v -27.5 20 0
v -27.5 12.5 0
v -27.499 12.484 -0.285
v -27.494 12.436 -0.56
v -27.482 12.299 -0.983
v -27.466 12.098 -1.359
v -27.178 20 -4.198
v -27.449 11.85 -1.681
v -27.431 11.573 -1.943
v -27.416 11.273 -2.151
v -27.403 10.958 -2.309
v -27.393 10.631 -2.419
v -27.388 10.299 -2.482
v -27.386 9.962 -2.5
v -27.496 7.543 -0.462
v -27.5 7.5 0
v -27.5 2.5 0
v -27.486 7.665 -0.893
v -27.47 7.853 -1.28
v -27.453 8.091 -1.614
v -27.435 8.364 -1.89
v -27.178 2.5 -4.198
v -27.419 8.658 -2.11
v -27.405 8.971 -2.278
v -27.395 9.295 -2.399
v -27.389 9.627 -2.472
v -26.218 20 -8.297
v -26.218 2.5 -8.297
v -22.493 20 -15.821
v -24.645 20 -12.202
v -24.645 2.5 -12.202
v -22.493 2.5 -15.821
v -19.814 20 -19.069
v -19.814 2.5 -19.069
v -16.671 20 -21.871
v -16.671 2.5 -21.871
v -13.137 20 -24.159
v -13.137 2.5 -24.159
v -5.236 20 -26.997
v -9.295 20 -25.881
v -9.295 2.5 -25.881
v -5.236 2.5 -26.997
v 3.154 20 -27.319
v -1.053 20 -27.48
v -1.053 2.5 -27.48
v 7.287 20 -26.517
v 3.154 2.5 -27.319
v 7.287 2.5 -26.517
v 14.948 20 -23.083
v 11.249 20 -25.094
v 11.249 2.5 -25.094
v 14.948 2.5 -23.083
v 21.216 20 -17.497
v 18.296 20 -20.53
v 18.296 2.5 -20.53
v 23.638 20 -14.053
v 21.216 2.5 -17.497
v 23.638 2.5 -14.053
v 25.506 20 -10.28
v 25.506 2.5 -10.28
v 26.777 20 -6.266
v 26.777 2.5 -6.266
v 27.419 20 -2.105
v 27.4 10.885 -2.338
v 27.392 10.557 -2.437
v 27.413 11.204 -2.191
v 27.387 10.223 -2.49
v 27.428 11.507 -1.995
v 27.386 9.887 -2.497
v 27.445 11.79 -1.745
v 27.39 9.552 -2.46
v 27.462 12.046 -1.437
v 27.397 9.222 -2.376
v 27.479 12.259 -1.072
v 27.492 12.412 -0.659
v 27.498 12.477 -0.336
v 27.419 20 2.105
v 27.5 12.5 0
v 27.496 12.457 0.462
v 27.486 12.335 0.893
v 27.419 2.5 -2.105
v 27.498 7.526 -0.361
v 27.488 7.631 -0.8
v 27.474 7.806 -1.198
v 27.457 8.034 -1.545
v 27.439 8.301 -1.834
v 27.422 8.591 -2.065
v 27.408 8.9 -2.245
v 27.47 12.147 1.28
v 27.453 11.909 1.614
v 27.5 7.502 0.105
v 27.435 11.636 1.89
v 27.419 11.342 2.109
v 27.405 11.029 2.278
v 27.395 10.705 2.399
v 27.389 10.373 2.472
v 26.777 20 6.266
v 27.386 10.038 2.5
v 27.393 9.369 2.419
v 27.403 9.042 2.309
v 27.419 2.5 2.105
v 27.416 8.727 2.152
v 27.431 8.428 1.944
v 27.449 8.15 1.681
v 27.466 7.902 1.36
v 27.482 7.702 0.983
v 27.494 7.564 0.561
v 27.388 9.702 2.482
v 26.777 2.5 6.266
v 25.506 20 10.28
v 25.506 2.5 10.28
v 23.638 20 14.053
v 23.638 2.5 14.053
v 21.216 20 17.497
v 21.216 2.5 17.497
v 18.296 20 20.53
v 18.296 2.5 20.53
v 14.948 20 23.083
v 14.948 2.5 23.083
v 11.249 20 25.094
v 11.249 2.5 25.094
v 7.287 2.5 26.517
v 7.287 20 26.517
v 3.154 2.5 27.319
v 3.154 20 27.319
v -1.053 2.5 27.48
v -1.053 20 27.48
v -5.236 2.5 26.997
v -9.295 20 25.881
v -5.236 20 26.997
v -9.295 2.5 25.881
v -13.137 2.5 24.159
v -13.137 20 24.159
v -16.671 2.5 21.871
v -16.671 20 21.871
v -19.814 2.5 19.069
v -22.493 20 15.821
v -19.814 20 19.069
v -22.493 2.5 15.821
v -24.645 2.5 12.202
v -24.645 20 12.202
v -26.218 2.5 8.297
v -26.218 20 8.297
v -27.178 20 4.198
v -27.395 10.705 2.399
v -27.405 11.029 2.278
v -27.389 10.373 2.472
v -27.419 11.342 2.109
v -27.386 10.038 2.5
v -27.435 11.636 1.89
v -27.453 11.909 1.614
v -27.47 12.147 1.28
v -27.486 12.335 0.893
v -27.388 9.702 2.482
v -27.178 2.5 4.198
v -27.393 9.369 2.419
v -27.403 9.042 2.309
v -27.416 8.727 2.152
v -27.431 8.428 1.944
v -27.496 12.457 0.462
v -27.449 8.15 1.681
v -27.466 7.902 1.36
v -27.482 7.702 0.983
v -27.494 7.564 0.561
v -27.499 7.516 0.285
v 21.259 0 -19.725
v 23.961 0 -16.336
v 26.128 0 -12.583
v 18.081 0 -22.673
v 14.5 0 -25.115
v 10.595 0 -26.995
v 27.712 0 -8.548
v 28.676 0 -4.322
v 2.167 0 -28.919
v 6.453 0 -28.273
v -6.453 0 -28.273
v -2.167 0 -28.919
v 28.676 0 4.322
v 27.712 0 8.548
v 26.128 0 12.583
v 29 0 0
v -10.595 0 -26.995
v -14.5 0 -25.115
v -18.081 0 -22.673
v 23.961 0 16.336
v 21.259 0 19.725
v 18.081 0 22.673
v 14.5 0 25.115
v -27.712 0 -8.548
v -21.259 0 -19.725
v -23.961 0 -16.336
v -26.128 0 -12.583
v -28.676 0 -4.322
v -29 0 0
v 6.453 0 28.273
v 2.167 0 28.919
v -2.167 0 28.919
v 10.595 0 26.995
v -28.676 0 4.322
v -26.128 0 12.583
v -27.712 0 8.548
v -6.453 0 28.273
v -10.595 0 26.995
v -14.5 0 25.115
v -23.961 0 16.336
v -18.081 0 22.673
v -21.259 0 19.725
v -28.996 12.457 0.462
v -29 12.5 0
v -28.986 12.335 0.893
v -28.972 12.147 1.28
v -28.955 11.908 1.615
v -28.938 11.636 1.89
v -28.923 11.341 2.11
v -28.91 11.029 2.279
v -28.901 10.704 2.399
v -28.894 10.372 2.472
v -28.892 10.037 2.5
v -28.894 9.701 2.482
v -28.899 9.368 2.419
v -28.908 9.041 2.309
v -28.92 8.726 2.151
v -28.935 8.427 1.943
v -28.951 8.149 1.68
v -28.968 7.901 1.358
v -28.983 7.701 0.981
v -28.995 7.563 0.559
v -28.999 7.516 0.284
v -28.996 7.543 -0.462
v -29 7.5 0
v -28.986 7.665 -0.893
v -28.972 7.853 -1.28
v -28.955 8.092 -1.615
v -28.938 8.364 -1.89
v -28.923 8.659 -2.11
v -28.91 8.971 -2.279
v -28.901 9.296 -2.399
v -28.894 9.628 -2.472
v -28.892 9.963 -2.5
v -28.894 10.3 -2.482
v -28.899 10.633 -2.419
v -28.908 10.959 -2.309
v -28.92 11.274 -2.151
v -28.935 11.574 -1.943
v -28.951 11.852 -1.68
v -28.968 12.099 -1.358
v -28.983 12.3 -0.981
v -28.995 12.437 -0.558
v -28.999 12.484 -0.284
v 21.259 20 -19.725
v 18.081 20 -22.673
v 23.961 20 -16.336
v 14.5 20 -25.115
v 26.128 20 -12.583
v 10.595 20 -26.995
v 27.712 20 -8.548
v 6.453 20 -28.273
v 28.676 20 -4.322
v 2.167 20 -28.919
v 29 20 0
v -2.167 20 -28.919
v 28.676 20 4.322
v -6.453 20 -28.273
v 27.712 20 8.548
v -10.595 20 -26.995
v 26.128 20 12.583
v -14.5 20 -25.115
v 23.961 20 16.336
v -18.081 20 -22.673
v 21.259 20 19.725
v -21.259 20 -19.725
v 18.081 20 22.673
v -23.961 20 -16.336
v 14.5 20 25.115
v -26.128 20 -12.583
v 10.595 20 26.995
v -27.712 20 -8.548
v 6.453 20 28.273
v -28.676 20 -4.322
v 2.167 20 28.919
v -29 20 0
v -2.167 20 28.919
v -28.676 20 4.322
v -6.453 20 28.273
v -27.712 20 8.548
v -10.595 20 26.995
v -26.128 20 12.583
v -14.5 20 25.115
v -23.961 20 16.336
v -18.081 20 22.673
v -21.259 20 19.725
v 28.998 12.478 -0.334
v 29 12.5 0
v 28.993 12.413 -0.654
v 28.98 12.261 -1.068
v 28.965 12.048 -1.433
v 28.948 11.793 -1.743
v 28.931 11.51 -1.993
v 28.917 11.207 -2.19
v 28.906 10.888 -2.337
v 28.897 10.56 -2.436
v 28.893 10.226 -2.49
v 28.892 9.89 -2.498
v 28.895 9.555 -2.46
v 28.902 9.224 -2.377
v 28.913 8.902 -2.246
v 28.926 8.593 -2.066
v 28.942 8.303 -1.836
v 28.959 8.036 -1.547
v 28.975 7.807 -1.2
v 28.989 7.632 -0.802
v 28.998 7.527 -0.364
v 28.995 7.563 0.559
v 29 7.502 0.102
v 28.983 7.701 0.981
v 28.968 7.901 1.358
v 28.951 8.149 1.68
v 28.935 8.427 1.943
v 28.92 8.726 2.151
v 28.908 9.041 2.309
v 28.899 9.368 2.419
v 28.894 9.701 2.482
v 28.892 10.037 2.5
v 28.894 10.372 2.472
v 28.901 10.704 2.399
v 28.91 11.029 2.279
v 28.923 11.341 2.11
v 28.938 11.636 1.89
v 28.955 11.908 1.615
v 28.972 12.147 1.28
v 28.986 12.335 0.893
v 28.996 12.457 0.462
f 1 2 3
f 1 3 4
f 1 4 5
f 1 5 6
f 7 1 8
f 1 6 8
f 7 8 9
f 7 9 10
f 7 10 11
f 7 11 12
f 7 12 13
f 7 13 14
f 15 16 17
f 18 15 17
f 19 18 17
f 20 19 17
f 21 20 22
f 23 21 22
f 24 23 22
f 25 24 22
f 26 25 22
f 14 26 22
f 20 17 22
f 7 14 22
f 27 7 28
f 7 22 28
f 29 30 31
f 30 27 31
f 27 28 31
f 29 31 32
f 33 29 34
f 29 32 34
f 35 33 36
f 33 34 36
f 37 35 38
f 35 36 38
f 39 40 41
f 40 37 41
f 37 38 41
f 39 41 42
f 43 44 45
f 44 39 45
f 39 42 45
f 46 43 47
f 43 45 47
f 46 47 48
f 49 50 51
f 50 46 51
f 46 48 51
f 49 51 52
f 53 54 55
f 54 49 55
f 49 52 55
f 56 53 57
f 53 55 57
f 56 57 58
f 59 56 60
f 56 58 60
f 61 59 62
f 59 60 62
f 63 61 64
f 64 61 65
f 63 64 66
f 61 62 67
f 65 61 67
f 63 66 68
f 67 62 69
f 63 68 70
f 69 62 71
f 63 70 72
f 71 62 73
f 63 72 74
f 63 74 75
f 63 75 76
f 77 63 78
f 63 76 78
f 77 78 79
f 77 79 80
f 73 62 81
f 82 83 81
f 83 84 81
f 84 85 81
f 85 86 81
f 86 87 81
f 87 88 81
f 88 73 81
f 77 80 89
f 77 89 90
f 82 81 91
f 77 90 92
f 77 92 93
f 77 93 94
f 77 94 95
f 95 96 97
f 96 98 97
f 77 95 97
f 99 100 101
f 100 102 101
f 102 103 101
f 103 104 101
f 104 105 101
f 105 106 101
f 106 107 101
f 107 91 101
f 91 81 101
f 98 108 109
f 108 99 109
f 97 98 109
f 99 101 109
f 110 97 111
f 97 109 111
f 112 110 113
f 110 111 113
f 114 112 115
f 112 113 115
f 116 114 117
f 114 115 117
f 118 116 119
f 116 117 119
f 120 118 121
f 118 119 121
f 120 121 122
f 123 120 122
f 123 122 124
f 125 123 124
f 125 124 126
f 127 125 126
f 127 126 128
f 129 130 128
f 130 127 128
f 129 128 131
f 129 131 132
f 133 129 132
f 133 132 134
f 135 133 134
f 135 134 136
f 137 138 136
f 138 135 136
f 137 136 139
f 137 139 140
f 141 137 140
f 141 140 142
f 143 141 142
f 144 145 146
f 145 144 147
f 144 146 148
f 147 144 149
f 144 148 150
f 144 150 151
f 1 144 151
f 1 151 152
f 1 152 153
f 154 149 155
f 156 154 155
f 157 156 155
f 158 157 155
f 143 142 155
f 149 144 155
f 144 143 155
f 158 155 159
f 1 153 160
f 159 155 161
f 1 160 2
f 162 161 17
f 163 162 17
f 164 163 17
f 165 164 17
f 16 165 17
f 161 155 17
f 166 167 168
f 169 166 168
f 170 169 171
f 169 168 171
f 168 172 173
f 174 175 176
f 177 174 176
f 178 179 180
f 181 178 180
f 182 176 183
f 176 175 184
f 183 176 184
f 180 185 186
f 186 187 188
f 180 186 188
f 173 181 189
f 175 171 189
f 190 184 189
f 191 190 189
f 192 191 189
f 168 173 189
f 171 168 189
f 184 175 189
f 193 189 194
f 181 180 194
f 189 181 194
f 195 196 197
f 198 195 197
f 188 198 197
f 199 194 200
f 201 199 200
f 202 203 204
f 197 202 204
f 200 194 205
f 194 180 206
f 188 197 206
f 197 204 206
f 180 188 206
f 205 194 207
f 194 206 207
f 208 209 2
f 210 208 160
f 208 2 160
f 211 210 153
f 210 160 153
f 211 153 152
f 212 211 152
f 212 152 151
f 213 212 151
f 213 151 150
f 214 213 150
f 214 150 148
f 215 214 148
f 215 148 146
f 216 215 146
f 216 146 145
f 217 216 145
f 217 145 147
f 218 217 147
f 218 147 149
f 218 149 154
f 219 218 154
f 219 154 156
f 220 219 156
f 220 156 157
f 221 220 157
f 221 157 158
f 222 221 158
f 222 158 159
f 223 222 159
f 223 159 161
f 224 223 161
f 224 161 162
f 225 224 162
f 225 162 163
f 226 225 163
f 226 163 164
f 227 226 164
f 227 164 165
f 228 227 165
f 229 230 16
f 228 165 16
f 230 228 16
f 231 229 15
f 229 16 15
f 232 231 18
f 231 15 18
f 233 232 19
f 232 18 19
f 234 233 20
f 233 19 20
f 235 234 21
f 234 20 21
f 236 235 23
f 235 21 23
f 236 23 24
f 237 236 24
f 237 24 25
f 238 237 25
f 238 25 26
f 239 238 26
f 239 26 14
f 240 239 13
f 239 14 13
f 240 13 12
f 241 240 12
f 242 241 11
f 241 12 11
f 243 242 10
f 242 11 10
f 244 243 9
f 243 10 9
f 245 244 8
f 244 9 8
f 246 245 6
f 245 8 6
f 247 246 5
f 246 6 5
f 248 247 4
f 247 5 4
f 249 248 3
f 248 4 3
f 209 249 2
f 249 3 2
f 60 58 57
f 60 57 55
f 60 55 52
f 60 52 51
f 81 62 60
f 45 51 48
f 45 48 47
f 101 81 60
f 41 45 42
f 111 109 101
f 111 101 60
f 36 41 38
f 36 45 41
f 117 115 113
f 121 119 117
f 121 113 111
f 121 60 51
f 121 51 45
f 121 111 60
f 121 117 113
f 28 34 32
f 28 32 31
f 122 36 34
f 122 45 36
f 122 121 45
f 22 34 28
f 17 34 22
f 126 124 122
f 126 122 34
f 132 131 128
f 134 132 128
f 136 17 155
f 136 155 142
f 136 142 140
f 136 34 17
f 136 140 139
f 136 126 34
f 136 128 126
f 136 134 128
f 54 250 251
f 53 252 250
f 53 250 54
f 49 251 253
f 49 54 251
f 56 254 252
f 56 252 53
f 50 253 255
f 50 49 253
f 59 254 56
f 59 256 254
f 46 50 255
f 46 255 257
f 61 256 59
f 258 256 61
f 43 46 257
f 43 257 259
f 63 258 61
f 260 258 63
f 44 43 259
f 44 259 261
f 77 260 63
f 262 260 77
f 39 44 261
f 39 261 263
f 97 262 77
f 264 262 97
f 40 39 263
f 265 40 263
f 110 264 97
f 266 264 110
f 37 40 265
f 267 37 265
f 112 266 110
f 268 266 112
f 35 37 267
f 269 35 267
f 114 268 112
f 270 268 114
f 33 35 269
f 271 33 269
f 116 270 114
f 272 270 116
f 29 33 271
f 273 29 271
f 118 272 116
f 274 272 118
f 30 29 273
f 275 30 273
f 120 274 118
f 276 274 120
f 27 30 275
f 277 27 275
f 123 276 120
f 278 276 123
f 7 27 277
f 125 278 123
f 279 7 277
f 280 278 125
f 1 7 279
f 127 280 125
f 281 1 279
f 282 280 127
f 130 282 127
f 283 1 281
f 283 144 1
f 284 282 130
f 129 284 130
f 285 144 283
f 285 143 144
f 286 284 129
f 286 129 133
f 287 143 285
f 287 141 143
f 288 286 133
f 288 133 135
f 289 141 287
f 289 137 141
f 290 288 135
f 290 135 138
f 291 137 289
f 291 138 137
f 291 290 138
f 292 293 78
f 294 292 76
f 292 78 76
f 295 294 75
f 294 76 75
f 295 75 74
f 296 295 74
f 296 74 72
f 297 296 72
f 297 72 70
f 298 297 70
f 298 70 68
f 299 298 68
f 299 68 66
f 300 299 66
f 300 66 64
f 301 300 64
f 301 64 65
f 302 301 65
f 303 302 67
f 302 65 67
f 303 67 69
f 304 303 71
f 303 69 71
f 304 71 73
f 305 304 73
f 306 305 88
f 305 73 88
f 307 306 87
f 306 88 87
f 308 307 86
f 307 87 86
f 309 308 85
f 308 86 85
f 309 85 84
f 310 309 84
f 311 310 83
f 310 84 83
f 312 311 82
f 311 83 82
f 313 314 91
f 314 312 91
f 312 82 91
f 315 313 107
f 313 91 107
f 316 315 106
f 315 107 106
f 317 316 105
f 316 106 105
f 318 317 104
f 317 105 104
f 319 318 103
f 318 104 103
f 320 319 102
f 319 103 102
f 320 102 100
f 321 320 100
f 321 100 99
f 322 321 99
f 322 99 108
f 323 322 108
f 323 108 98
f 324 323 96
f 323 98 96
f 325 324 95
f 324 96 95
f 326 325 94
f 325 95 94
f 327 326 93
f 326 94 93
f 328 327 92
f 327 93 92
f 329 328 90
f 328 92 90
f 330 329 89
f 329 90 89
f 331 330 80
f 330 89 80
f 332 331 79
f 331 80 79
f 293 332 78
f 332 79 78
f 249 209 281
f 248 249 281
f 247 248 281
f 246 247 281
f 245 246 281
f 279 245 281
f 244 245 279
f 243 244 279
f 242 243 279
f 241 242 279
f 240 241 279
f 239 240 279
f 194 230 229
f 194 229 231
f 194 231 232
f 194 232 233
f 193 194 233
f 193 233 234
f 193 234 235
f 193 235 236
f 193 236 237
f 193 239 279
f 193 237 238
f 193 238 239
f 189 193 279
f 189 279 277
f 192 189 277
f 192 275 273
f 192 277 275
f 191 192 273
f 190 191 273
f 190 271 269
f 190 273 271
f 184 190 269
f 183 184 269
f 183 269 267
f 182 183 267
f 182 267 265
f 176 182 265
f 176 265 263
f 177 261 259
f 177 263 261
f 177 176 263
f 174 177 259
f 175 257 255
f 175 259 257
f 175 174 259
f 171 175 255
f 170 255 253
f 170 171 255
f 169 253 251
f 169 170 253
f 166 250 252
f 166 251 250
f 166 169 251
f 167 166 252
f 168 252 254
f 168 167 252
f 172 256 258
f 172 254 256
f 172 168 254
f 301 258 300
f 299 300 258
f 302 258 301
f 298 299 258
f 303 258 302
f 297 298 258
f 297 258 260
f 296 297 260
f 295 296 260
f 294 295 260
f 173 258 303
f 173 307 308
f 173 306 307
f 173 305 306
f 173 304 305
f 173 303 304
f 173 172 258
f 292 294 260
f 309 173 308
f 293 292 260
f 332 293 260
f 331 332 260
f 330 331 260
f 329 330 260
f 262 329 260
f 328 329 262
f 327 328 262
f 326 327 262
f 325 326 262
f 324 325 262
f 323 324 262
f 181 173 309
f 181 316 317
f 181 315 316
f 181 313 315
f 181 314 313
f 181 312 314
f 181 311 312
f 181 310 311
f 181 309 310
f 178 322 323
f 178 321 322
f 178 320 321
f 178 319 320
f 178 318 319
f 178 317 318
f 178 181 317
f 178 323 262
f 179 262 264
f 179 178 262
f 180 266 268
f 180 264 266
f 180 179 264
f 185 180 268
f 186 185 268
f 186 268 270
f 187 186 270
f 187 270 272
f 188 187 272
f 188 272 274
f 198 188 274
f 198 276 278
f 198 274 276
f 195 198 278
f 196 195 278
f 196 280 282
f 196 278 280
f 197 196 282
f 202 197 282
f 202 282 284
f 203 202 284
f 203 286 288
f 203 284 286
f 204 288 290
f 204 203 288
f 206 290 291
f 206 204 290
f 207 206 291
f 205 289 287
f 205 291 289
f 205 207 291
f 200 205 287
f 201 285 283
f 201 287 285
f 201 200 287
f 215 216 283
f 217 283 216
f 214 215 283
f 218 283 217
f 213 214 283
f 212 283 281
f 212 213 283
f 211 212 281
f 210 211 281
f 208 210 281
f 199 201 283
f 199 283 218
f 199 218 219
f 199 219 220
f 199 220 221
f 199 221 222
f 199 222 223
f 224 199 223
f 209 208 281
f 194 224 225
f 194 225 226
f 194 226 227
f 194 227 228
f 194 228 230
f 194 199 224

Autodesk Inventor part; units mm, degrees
ref_plane "YZ Plane" through (0, 0, 0) normal (1, 0, 0) x (0, 1, 0)
ref_plane "XZ Plane" through (0, 0, 0) normal (0, 1, 0) x (-1, 0, 0)
ref_plane "XY Plane" through (0, 0, 0) normal (0, 0, 1) x (1, 0, 0)
sketch "Sketch1" plane through (0, 0, 0) normal (0, 1, 0) x (-1, 0, 0)
  circle A0 centre (0, 0) radius 27.5
  circle A1 centre (0, 0) radius 29
  dimension "d0" = 55
  dimension "d1" = 58
extrude "Extrusion1" add sketch "Sketch1" along normal blind 2.5 contours A0
extrude "Extrusion2" add sketch "Sketch1" along normal blind 20
sketch "Sketch3" plane through (0, 0, 0) normal (1, 0, 0) x (0, 1, 0)
  circle A0 centre (10, 0) radius 2.5
  line L0 (0, -29) -> (0, 29) projected
  point P0 (0, 0)
  dimension "d6" = 5
  dimension "d7" = 10
extrude "Extrusion3" cut sketch "Sketch3" along normal through all both and the other way through all
properties part number "Tapa_Tubo_PVC"
